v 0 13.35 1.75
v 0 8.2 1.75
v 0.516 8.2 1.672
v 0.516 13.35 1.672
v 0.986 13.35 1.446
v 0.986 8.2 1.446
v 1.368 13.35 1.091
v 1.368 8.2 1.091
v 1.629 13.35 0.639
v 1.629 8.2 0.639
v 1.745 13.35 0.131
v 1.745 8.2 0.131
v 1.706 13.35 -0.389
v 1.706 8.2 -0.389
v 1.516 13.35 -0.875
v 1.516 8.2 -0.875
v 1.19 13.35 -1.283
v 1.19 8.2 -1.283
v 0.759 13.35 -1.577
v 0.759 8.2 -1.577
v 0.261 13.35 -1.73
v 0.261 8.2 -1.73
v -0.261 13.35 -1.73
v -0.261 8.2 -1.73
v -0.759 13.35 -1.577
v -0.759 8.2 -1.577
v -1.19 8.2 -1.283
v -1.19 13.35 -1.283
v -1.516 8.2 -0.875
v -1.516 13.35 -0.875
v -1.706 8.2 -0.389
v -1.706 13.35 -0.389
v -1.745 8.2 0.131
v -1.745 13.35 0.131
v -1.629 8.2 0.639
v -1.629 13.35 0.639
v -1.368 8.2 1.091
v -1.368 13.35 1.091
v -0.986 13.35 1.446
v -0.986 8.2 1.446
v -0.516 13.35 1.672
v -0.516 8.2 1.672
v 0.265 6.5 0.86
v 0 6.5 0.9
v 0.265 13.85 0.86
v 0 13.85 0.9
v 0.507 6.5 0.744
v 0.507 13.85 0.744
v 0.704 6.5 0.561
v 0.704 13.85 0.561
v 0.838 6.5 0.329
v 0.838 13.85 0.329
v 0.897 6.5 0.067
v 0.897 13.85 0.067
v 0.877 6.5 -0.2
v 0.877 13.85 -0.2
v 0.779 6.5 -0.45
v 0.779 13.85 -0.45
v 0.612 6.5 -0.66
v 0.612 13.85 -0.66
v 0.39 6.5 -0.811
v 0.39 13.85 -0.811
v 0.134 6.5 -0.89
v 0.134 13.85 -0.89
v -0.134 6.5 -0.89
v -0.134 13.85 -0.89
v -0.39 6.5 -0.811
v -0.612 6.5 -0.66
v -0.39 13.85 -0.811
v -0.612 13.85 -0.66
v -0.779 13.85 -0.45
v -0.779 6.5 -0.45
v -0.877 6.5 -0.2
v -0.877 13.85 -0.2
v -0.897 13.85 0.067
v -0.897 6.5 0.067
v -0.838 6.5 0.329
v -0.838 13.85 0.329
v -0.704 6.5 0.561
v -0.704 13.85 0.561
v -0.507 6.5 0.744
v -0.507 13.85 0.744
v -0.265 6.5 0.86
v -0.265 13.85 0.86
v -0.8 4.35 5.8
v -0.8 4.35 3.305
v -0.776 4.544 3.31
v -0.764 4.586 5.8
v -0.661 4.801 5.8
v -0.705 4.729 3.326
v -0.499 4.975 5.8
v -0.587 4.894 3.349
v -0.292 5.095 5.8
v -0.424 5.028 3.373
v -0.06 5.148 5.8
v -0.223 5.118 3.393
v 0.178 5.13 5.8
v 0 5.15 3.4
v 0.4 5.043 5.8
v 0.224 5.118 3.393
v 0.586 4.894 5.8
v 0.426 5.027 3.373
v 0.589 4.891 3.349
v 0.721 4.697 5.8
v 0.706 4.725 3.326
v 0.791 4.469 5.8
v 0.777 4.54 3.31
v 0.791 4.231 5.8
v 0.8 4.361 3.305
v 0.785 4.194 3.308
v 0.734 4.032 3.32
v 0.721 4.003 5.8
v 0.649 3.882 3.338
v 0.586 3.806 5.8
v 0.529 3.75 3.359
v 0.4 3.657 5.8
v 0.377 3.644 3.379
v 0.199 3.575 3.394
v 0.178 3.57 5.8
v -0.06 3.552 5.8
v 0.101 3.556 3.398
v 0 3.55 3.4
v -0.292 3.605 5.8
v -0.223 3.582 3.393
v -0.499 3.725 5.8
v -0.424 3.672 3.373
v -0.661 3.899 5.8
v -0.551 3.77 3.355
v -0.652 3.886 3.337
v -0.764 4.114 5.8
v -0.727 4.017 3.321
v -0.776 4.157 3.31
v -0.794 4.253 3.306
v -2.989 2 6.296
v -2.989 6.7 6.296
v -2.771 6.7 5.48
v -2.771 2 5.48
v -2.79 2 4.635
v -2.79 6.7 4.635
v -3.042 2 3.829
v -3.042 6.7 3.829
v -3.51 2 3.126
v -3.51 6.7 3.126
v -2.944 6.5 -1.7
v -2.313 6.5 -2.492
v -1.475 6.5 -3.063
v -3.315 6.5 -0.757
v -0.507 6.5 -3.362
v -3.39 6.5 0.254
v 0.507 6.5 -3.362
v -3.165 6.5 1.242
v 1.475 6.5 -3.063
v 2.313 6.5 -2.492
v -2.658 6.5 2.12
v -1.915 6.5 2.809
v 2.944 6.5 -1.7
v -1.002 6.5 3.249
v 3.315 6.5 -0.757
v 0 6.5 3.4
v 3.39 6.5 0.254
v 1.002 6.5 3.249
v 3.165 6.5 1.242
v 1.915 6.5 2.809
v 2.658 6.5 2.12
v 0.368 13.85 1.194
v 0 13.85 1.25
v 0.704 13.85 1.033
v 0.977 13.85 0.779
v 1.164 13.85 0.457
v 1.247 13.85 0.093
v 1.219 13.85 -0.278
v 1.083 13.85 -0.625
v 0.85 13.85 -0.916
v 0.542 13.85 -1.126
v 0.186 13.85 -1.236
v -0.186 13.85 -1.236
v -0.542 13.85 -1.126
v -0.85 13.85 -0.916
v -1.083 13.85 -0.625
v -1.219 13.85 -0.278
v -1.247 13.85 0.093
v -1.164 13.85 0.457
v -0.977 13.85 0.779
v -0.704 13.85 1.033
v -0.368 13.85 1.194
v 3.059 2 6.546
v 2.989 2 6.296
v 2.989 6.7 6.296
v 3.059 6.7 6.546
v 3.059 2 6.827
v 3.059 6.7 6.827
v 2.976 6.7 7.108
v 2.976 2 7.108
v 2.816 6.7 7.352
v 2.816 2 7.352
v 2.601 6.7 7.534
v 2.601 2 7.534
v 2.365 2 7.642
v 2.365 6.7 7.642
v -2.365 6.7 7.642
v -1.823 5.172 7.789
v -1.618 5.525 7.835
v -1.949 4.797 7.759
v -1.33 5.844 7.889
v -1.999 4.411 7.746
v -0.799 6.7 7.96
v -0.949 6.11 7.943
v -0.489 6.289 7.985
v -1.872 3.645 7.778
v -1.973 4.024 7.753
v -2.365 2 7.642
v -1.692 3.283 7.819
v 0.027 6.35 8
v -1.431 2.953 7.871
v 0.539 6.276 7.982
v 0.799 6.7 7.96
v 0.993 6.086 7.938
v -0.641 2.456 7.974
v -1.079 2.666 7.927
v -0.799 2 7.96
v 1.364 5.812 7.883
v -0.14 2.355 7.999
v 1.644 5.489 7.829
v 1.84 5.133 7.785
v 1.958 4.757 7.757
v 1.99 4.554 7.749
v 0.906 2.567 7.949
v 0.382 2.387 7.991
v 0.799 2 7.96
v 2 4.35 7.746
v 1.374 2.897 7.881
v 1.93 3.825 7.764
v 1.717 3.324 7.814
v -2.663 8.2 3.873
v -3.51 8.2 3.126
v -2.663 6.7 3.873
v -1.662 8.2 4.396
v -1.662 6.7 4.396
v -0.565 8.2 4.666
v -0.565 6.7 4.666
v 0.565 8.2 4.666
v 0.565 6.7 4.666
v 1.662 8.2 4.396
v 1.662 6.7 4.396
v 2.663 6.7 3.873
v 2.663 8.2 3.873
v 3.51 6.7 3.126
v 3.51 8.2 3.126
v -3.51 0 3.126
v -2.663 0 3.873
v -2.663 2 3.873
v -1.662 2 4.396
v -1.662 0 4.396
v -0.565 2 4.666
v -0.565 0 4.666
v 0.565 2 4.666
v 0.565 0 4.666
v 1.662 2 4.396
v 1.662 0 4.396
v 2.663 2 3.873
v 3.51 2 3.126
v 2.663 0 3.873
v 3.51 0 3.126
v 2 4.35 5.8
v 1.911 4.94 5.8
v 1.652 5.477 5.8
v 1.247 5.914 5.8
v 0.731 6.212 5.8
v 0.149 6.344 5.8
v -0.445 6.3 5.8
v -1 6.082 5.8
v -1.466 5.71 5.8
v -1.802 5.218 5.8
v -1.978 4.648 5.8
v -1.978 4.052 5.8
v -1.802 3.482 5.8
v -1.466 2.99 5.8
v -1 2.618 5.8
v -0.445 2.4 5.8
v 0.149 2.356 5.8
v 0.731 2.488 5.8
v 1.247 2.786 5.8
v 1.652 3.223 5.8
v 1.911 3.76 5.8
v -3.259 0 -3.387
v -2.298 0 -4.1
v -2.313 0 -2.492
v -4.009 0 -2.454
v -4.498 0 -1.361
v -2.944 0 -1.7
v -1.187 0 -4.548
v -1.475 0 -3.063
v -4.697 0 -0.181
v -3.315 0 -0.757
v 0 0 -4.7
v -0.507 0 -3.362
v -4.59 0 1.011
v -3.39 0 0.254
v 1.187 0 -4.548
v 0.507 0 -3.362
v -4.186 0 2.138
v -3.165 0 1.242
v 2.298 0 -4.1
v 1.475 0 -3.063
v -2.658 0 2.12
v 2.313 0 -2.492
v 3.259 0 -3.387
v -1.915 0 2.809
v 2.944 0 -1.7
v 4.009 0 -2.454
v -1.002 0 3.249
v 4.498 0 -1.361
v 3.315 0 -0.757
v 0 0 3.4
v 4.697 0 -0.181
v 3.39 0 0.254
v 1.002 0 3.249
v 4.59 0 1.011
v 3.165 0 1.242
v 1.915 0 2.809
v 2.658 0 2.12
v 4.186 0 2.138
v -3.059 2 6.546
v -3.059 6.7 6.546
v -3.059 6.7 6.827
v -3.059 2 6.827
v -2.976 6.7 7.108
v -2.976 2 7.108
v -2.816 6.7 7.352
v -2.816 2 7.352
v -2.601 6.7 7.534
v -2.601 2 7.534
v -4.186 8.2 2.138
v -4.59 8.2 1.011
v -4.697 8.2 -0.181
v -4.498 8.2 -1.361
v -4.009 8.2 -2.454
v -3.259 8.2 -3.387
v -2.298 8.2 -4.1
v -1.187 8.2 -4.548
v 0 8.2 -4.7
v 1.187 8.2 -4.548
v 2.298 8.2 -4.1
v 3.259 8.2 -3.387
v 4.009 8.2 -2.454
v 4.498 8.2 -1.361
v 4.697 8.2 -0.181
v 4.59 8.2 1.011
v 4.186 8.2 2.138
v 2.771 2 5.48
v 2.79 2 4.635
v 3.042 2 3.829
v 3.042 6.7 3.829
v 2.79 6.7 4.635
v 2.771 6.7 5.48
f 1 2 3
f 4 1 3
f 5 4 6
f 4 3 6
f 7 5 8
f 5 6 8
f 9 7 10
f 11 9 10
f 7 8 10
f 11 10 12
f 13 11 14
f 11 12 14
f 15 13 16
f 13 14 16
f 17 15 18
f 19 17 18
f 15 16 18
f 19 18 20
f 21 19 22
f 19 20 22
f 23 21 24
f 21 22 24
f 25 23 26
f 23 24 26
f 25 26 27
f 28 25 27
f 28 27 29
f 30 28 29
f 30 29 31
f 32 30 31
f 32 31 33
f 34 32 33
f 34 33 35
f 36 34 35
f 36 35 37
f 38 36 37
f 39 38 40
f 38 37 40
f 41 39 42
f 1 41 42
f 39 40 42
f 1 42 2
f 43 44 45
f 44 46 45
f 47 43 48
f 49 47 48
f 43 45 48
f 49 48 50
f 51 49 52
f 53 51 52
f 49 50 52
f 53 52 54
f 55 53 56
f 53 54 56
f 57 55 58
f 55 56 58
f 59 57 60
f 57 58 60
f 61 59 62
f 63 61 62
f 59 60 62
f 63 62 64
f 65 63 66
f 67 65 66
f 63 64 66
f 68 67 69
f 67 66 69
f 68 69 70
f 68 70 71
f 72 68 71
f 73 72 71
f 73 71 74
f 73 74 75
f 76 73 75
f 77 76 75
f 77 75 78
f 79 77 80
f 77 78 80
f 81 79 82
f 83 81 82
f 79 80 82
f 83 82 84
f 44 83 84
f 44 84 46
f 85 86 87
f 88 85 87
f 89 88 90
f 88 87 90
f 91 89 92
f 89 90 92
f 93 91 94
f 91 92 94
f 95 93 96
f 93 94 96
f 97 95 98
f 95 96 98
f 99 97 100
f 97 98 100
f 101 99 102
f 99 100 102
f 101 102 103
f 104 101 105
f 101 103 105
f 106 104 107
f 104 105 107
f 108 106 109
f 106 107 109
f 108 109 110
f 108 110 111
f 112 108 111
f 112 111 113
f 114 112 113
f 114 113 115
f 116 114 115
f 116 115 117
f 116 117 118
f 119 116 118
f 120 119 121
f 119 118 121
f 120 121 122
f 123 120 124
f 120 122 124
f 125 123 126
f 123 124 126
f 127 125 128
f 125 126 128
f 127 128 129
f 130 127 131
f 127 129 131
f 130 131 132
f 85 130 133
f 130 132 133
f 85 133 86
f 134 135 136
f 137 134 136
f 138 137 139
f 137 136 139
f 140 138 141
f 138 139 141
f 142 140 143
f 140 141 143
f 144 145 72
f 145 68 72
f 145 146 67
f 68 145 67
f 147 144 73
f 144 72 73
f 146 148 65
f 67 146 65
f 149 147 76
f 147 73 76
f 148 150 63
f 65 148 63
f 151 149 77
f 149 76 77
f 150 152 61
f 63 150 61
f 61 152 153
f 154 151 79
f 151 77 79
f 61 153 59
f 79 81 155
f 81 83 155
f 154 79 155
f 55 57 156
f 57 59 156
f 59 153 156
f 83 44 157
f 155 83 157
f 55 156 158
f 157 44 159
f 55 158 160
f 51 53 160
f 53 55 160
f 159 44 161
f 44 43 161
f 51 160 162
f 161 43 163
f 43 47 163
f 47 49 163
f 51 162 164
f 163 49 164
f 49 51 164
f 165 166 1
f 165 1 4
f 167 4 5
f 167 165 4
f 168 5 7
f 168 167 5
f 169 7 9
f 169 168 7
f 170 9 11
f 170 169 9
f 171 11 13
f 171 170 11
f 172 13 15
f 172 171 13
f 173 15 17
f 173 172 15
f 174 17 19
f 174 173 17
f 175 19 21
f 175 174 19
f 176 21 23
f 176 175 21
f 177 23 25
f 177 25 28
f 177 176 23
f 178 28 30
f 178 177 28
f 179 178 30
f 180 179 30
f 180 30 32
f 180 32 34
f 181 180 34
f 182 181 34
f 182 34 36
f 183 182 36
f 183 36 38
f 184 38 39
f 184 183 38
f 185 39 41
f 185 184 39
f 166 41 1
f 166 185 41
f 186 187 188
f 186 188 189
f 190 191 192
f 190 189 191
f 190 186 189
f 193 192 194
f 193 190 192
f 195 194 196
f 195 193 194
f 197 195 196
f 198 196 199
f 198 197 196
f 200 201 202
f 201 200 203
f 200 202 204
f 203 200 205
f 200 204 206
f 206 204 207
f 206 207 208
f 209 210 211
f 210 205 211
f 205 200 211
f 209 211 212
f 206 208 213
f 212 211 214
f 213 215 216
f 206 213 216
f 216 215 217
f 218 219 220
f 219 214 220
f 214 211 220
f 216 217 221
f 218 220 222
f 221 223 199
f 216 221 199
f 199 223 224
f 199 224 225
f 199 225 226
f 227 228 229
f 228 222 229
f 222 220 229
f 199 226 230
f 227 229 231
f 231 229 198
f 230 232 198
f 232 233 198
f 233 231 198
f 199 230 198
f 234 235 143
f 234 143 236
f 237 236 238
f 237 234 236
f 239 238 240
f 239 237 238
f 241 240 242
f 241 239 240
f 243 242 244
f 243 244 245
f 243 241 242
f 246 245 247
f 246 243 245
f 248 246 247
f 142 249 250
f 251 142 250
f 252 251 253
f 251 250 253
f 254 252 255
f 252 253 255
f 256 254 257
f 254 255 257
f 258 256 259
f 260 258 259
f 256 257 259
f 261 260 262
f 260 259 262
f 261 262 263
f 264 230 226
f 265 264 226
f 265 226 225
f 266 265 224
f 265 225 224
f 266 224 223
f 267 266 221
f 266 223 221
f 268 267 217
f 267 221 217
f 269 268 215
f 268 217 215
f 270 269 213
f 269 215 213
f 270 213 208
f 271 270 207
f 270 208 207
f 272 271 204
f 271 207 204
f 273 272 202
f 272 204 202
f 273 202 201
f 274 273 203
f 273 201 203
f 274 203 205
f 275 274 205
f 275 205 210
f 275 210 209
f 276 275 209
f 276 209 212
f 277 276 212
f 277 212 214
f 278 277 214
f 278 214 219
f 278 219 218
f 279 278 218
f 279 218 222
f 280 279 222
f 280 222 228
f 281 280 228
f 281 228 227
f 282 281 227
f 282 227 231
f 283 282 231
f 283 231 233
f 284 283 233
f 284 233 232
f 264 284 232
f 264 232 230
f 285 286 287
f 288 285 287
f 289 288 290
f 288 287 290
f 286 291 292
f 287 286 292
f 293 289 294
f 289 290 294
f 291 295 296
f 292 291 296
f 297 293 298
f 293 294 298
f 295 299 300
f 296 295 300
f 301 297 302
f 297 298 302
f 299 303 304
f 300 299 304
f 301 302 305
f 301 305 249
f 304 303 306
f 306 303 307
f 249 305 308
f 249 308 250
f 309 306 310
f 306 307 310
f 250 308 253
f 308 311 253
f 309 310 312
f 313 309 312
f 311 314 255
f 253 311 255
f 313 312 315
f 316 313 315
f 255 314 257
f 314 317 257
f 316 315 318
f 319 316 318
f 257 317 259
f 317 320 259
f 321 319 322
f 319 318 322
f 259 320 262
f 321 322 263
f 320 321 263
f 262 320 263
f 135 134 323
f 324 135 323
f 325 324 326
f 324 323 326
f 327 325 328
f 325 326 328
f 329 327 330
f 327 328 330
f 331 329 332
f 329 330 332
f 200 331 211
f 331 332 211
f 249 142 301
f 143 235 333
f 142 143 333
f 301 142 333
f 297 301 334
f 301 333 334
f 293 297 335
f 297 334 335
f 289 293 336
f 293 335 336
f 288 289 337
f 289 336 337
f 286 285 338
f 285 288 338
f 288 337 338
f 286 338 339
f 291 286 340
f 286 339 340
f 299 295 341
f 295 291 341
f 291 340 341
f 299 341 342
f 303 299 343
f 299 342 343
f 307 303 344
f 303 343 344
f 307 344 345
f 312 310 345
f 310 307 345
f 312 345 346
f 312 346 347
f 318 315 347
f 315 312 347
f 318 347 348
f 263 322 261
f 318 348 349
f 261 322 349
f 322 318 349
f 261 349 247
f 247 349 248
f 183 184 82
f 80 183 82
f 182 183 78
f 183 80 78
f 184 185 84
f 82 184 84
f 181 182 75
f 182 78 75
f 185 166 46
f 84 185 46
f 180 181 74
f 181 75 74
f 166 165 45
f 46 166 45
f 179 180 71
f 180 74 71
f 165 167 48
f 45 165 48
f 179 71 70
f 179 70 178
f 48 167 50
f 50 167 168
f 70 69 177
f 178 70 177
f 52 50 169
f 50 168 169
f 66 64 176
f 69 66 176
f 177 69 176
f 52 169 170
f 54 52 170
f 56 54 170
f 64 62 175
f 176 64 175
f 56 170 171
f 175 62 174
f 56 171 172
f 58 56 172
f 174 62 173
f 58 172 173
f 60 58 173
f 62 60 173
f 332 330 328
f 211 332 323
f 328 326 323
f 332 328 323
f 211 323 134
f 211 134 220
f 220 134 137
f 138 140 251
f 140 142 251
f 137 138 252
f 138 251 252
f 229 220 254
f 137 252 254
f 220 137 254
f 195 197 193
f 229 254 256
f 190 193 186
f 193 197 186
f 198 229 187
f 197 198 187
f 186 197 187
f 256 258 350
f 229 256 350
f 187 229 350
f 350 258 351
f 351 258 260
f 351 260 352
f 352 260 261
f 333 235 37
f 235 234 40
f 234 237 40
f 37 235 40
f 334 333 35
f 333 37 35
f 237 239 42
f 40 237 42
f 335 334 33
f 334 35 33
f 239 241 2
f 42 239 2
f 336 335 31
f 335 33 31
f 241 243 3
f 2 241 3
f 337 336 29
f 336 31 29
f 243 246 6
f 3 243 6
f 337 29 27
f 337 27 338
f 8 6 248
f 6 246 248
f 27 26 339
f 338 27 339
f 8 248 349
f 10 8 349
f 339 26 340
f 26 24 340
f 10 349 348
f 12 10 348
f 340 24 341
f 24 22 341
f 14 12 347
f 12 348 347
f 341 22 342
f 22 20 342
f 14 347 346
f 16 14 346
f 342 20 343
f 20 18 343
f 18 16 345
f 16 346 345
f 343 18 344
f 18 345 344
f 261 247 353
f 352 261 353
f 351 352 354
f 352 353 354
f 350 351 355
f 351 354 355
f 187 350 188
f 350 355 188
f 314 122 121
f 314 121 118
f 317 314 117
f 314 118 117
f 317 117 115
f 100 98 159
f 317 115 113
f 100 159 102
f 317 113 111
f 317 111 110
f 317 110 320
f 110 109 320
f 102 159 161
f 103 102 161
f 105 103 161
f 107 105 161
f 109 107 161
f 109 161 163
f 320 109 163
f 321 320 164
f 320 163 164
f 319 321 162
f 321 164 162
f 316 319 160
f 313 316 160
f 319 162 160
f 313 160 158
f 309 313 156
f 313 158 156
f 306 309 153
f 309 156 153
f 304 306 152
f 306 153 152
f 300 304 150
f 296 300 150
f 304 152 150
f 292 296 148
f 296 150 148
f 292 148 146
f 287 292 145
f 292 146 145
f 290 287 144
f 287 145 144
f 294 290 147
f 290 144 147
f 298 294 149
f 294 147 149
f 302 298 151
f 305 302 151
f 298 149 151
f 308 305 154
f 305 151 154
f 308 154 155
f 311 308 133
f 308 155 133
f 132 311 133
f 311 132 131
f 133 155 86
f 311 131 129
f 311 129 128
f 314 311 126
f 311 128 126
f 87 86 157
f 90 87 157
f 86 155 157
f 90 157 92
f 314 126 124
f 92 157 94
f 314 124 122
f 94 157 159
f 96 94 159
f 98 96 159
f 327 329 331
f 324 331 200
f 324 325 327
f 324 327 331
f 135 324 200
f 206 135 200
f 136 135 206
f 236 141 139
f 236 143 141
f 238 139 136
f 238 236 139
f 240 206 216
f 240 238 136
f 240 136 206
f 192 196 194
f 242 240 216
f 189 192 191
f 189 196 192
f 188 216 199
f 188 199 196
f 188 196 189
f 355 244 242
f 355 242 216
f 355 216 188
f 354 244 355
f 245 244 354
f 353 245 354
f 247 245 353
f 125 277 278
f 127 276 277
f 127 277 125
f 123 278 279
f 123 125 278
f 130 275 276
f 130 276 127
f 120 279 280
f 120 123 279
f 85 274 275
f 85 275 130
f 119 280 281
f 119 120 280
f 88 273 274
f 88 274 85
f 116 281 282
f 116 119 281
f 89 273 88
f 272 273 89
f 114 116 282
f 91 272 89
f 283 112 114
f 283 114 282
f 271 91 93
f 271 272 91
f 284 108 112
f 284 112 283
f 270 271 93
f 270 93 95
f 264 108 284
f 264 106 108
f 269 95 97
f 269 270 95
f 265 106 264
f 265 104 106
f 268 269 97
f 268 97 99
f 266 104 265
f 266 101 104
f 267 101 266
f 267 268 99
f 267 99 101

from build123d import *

# Parameters (mm, degrees)
CUT_EXTRUDE_1_DEPTH   = 9.2
FILLET_1_R            = 1
SKETCH_5_OUTSIDE_W    = 15.602
SKETCH_5_OUTSIDE_H    = 18.902
SKETCH_5_OUTSIDE_R    = 4.7
CUT_EXTRUDE_4_DEPTH   = 1.5
CUT_EXTRUDE_START     = -8.2
SKETCH_5_2_OUTSIDE_W  = 15.602
SKETCH_5_2_OUTSIDE_H  = 18.902
SKETCH_5_2_OUTSIDE_R  = 4.7
CUT_EXTRUDE_5_DEPTH   = 2
CHAMFER_1_SIZE        = 0.5
M2_TAPPED_HOLE1_D     = 1.6
M2_TAPPED_HOLE1_DEPTH = 5.2
M2_TAPPED_HOLE1_TIP   = 0.480688495
SKETCH4_R             = 2
CUT_EXTRUDE1_DEPTH    = 2.2


with BuildPart() as part:
    # Эскиз1 → Повернуть1 (revolve)
    with BuildSketch(Plane(origin=(0, 0, 0), x_dir=(0, 0, -1), z_dir=(1, 0, 0))):
        Polygon((-3.4, 0), (-3.4, 6.5), (-0.9, 6.5), (-0.9, 13.85), (-1.75, 13.85), (-1.75, 8.2), (-8, 8.2), (-8, 0), align=None)
    revolve(axis=Axis((0, 0, 0), (0, 1, 0)))

    # Эскиз2 → Вырез-Вытянуть1 (cut, through all)
    with BuildSketch(Plane(origin=(0, 8.2, 0), x_dir=(1, 0, 0), z_dir=(0, 1, 0))):
        with BuildLine():
            ThreePointArc((7.99025974, -7.116582697), (0, 10.7), (-7.99025974, -7.116582697))
            ThreePointArc((-7.99025974, -7.116582697), (-3.75469644, -7.361538877), (-3.50974026, -3.125975577))
            ThreePointArc((-3.50974026, -3.125975577), (0, 4.7), (3.50974026, -3.125975577))
            ThreePointArc((3.50974026, -3.125975577), (3.75469644, -7.361538877), (7.99025974, -7.116582697))
        make_face()
    extrude(amount=-CUT_EXTRUDE_1_DEPTH, mode=Mode.SUBTRACT)

    # Скругление1
    fillet_1_edges = [part.edges().sort_by_distance(p)[0] for p in [
        (-3.555293146, 4.1, 7.166581517),
        (3.555293146, 4.1, 7.166581517),
    ]]
    fillet(fillet_1_edges, radius=FILLET_1_R)

    # Эскиз5 outside → Вырез-Вытянуть4 (cut)
    with BuildSketch(Plane(origin=(0, 8.2, 0), x_dir=(1, 0, 0), z_dir=(0, 1, 0))):
        with Locations((0, -1.65)):
            Rectangle(SKETCH_5_OUTSIDE_W, SKETCH_5_OUTSIDE_H)
        Circle(SKETCH_5_OUTSIDE_R, mode=Mode.SUBTRACT)
    extrude(amount=-CUT_EXTRUDE_4_DEPTH, mode=Mode.SUBTRACT)

    # Эскиз5<2> outside → Вырез-Вытянуть5 (cut)
    with BuildSketch(Plane(origin=(0, 8.2, 0), x_dir=(1, 0, 0), z_dir=(0, 1, 0)).offset(CUT_EXTRUDE_START)):
        with Locations((0, -1.65)):
            Rectangle(SKETCH_5_2_OUTSIDE_W, SKETCH_5_2_OUTSIDE_H)
        Circle(SKETCH_5_2_OUTSIDE_R, mode=Mode.SUBTRACT)
    extrude(amount=CUT_EXTRUDE_5_DEPTH, mode=Mode.SUBTRACT)

    # Фаска1
    chamfer_1_edges = [part.edges().sort_by_distance(p)[0] for p in [
        (0, 13.85, -1.75),
    ]]
    chamfer(chamfer_1_edges, length=CHAMFER_1_SIZE)

    # M2 Tapped Hole1
    with Locations(Plane(origin=(0, 8.2, 8), x_dir=(1, 0, 0), z_dir=(0, 0, 1))):
        with Locations((0, -3.85)):
            Hole(M2_TAPPED_HOLE1_D / 2, depth=M2_TAPPED_HOLE1_DEPTH)
            with Locations((0, 0, -(M2_TAPPED_HOLE1_DEPTH + M2_TAPPED_HOLE1_TIP / 2))):  # 118° drill point
                Cone(0, M2_TAPPED_HOLE1_D / 2, M2_TAPPED_HOLE1_TIP, mode=Mode.SUBTRACT)

    # Sketch4 → Cut-Extrude1 (cut)
    with BuildSketch(Plane(origin=(0, 8.2, 8), x_dir=(1, 0, 0), z_dir=(0, 0, 1))):
        with Locations((0, -3.85)):
            Circle(SKETCH4_R)
    extrude(amount=-CUT_EXTRUDE1_DEPTH, mode=Mode.SUBTRACT)


solid = part.part
